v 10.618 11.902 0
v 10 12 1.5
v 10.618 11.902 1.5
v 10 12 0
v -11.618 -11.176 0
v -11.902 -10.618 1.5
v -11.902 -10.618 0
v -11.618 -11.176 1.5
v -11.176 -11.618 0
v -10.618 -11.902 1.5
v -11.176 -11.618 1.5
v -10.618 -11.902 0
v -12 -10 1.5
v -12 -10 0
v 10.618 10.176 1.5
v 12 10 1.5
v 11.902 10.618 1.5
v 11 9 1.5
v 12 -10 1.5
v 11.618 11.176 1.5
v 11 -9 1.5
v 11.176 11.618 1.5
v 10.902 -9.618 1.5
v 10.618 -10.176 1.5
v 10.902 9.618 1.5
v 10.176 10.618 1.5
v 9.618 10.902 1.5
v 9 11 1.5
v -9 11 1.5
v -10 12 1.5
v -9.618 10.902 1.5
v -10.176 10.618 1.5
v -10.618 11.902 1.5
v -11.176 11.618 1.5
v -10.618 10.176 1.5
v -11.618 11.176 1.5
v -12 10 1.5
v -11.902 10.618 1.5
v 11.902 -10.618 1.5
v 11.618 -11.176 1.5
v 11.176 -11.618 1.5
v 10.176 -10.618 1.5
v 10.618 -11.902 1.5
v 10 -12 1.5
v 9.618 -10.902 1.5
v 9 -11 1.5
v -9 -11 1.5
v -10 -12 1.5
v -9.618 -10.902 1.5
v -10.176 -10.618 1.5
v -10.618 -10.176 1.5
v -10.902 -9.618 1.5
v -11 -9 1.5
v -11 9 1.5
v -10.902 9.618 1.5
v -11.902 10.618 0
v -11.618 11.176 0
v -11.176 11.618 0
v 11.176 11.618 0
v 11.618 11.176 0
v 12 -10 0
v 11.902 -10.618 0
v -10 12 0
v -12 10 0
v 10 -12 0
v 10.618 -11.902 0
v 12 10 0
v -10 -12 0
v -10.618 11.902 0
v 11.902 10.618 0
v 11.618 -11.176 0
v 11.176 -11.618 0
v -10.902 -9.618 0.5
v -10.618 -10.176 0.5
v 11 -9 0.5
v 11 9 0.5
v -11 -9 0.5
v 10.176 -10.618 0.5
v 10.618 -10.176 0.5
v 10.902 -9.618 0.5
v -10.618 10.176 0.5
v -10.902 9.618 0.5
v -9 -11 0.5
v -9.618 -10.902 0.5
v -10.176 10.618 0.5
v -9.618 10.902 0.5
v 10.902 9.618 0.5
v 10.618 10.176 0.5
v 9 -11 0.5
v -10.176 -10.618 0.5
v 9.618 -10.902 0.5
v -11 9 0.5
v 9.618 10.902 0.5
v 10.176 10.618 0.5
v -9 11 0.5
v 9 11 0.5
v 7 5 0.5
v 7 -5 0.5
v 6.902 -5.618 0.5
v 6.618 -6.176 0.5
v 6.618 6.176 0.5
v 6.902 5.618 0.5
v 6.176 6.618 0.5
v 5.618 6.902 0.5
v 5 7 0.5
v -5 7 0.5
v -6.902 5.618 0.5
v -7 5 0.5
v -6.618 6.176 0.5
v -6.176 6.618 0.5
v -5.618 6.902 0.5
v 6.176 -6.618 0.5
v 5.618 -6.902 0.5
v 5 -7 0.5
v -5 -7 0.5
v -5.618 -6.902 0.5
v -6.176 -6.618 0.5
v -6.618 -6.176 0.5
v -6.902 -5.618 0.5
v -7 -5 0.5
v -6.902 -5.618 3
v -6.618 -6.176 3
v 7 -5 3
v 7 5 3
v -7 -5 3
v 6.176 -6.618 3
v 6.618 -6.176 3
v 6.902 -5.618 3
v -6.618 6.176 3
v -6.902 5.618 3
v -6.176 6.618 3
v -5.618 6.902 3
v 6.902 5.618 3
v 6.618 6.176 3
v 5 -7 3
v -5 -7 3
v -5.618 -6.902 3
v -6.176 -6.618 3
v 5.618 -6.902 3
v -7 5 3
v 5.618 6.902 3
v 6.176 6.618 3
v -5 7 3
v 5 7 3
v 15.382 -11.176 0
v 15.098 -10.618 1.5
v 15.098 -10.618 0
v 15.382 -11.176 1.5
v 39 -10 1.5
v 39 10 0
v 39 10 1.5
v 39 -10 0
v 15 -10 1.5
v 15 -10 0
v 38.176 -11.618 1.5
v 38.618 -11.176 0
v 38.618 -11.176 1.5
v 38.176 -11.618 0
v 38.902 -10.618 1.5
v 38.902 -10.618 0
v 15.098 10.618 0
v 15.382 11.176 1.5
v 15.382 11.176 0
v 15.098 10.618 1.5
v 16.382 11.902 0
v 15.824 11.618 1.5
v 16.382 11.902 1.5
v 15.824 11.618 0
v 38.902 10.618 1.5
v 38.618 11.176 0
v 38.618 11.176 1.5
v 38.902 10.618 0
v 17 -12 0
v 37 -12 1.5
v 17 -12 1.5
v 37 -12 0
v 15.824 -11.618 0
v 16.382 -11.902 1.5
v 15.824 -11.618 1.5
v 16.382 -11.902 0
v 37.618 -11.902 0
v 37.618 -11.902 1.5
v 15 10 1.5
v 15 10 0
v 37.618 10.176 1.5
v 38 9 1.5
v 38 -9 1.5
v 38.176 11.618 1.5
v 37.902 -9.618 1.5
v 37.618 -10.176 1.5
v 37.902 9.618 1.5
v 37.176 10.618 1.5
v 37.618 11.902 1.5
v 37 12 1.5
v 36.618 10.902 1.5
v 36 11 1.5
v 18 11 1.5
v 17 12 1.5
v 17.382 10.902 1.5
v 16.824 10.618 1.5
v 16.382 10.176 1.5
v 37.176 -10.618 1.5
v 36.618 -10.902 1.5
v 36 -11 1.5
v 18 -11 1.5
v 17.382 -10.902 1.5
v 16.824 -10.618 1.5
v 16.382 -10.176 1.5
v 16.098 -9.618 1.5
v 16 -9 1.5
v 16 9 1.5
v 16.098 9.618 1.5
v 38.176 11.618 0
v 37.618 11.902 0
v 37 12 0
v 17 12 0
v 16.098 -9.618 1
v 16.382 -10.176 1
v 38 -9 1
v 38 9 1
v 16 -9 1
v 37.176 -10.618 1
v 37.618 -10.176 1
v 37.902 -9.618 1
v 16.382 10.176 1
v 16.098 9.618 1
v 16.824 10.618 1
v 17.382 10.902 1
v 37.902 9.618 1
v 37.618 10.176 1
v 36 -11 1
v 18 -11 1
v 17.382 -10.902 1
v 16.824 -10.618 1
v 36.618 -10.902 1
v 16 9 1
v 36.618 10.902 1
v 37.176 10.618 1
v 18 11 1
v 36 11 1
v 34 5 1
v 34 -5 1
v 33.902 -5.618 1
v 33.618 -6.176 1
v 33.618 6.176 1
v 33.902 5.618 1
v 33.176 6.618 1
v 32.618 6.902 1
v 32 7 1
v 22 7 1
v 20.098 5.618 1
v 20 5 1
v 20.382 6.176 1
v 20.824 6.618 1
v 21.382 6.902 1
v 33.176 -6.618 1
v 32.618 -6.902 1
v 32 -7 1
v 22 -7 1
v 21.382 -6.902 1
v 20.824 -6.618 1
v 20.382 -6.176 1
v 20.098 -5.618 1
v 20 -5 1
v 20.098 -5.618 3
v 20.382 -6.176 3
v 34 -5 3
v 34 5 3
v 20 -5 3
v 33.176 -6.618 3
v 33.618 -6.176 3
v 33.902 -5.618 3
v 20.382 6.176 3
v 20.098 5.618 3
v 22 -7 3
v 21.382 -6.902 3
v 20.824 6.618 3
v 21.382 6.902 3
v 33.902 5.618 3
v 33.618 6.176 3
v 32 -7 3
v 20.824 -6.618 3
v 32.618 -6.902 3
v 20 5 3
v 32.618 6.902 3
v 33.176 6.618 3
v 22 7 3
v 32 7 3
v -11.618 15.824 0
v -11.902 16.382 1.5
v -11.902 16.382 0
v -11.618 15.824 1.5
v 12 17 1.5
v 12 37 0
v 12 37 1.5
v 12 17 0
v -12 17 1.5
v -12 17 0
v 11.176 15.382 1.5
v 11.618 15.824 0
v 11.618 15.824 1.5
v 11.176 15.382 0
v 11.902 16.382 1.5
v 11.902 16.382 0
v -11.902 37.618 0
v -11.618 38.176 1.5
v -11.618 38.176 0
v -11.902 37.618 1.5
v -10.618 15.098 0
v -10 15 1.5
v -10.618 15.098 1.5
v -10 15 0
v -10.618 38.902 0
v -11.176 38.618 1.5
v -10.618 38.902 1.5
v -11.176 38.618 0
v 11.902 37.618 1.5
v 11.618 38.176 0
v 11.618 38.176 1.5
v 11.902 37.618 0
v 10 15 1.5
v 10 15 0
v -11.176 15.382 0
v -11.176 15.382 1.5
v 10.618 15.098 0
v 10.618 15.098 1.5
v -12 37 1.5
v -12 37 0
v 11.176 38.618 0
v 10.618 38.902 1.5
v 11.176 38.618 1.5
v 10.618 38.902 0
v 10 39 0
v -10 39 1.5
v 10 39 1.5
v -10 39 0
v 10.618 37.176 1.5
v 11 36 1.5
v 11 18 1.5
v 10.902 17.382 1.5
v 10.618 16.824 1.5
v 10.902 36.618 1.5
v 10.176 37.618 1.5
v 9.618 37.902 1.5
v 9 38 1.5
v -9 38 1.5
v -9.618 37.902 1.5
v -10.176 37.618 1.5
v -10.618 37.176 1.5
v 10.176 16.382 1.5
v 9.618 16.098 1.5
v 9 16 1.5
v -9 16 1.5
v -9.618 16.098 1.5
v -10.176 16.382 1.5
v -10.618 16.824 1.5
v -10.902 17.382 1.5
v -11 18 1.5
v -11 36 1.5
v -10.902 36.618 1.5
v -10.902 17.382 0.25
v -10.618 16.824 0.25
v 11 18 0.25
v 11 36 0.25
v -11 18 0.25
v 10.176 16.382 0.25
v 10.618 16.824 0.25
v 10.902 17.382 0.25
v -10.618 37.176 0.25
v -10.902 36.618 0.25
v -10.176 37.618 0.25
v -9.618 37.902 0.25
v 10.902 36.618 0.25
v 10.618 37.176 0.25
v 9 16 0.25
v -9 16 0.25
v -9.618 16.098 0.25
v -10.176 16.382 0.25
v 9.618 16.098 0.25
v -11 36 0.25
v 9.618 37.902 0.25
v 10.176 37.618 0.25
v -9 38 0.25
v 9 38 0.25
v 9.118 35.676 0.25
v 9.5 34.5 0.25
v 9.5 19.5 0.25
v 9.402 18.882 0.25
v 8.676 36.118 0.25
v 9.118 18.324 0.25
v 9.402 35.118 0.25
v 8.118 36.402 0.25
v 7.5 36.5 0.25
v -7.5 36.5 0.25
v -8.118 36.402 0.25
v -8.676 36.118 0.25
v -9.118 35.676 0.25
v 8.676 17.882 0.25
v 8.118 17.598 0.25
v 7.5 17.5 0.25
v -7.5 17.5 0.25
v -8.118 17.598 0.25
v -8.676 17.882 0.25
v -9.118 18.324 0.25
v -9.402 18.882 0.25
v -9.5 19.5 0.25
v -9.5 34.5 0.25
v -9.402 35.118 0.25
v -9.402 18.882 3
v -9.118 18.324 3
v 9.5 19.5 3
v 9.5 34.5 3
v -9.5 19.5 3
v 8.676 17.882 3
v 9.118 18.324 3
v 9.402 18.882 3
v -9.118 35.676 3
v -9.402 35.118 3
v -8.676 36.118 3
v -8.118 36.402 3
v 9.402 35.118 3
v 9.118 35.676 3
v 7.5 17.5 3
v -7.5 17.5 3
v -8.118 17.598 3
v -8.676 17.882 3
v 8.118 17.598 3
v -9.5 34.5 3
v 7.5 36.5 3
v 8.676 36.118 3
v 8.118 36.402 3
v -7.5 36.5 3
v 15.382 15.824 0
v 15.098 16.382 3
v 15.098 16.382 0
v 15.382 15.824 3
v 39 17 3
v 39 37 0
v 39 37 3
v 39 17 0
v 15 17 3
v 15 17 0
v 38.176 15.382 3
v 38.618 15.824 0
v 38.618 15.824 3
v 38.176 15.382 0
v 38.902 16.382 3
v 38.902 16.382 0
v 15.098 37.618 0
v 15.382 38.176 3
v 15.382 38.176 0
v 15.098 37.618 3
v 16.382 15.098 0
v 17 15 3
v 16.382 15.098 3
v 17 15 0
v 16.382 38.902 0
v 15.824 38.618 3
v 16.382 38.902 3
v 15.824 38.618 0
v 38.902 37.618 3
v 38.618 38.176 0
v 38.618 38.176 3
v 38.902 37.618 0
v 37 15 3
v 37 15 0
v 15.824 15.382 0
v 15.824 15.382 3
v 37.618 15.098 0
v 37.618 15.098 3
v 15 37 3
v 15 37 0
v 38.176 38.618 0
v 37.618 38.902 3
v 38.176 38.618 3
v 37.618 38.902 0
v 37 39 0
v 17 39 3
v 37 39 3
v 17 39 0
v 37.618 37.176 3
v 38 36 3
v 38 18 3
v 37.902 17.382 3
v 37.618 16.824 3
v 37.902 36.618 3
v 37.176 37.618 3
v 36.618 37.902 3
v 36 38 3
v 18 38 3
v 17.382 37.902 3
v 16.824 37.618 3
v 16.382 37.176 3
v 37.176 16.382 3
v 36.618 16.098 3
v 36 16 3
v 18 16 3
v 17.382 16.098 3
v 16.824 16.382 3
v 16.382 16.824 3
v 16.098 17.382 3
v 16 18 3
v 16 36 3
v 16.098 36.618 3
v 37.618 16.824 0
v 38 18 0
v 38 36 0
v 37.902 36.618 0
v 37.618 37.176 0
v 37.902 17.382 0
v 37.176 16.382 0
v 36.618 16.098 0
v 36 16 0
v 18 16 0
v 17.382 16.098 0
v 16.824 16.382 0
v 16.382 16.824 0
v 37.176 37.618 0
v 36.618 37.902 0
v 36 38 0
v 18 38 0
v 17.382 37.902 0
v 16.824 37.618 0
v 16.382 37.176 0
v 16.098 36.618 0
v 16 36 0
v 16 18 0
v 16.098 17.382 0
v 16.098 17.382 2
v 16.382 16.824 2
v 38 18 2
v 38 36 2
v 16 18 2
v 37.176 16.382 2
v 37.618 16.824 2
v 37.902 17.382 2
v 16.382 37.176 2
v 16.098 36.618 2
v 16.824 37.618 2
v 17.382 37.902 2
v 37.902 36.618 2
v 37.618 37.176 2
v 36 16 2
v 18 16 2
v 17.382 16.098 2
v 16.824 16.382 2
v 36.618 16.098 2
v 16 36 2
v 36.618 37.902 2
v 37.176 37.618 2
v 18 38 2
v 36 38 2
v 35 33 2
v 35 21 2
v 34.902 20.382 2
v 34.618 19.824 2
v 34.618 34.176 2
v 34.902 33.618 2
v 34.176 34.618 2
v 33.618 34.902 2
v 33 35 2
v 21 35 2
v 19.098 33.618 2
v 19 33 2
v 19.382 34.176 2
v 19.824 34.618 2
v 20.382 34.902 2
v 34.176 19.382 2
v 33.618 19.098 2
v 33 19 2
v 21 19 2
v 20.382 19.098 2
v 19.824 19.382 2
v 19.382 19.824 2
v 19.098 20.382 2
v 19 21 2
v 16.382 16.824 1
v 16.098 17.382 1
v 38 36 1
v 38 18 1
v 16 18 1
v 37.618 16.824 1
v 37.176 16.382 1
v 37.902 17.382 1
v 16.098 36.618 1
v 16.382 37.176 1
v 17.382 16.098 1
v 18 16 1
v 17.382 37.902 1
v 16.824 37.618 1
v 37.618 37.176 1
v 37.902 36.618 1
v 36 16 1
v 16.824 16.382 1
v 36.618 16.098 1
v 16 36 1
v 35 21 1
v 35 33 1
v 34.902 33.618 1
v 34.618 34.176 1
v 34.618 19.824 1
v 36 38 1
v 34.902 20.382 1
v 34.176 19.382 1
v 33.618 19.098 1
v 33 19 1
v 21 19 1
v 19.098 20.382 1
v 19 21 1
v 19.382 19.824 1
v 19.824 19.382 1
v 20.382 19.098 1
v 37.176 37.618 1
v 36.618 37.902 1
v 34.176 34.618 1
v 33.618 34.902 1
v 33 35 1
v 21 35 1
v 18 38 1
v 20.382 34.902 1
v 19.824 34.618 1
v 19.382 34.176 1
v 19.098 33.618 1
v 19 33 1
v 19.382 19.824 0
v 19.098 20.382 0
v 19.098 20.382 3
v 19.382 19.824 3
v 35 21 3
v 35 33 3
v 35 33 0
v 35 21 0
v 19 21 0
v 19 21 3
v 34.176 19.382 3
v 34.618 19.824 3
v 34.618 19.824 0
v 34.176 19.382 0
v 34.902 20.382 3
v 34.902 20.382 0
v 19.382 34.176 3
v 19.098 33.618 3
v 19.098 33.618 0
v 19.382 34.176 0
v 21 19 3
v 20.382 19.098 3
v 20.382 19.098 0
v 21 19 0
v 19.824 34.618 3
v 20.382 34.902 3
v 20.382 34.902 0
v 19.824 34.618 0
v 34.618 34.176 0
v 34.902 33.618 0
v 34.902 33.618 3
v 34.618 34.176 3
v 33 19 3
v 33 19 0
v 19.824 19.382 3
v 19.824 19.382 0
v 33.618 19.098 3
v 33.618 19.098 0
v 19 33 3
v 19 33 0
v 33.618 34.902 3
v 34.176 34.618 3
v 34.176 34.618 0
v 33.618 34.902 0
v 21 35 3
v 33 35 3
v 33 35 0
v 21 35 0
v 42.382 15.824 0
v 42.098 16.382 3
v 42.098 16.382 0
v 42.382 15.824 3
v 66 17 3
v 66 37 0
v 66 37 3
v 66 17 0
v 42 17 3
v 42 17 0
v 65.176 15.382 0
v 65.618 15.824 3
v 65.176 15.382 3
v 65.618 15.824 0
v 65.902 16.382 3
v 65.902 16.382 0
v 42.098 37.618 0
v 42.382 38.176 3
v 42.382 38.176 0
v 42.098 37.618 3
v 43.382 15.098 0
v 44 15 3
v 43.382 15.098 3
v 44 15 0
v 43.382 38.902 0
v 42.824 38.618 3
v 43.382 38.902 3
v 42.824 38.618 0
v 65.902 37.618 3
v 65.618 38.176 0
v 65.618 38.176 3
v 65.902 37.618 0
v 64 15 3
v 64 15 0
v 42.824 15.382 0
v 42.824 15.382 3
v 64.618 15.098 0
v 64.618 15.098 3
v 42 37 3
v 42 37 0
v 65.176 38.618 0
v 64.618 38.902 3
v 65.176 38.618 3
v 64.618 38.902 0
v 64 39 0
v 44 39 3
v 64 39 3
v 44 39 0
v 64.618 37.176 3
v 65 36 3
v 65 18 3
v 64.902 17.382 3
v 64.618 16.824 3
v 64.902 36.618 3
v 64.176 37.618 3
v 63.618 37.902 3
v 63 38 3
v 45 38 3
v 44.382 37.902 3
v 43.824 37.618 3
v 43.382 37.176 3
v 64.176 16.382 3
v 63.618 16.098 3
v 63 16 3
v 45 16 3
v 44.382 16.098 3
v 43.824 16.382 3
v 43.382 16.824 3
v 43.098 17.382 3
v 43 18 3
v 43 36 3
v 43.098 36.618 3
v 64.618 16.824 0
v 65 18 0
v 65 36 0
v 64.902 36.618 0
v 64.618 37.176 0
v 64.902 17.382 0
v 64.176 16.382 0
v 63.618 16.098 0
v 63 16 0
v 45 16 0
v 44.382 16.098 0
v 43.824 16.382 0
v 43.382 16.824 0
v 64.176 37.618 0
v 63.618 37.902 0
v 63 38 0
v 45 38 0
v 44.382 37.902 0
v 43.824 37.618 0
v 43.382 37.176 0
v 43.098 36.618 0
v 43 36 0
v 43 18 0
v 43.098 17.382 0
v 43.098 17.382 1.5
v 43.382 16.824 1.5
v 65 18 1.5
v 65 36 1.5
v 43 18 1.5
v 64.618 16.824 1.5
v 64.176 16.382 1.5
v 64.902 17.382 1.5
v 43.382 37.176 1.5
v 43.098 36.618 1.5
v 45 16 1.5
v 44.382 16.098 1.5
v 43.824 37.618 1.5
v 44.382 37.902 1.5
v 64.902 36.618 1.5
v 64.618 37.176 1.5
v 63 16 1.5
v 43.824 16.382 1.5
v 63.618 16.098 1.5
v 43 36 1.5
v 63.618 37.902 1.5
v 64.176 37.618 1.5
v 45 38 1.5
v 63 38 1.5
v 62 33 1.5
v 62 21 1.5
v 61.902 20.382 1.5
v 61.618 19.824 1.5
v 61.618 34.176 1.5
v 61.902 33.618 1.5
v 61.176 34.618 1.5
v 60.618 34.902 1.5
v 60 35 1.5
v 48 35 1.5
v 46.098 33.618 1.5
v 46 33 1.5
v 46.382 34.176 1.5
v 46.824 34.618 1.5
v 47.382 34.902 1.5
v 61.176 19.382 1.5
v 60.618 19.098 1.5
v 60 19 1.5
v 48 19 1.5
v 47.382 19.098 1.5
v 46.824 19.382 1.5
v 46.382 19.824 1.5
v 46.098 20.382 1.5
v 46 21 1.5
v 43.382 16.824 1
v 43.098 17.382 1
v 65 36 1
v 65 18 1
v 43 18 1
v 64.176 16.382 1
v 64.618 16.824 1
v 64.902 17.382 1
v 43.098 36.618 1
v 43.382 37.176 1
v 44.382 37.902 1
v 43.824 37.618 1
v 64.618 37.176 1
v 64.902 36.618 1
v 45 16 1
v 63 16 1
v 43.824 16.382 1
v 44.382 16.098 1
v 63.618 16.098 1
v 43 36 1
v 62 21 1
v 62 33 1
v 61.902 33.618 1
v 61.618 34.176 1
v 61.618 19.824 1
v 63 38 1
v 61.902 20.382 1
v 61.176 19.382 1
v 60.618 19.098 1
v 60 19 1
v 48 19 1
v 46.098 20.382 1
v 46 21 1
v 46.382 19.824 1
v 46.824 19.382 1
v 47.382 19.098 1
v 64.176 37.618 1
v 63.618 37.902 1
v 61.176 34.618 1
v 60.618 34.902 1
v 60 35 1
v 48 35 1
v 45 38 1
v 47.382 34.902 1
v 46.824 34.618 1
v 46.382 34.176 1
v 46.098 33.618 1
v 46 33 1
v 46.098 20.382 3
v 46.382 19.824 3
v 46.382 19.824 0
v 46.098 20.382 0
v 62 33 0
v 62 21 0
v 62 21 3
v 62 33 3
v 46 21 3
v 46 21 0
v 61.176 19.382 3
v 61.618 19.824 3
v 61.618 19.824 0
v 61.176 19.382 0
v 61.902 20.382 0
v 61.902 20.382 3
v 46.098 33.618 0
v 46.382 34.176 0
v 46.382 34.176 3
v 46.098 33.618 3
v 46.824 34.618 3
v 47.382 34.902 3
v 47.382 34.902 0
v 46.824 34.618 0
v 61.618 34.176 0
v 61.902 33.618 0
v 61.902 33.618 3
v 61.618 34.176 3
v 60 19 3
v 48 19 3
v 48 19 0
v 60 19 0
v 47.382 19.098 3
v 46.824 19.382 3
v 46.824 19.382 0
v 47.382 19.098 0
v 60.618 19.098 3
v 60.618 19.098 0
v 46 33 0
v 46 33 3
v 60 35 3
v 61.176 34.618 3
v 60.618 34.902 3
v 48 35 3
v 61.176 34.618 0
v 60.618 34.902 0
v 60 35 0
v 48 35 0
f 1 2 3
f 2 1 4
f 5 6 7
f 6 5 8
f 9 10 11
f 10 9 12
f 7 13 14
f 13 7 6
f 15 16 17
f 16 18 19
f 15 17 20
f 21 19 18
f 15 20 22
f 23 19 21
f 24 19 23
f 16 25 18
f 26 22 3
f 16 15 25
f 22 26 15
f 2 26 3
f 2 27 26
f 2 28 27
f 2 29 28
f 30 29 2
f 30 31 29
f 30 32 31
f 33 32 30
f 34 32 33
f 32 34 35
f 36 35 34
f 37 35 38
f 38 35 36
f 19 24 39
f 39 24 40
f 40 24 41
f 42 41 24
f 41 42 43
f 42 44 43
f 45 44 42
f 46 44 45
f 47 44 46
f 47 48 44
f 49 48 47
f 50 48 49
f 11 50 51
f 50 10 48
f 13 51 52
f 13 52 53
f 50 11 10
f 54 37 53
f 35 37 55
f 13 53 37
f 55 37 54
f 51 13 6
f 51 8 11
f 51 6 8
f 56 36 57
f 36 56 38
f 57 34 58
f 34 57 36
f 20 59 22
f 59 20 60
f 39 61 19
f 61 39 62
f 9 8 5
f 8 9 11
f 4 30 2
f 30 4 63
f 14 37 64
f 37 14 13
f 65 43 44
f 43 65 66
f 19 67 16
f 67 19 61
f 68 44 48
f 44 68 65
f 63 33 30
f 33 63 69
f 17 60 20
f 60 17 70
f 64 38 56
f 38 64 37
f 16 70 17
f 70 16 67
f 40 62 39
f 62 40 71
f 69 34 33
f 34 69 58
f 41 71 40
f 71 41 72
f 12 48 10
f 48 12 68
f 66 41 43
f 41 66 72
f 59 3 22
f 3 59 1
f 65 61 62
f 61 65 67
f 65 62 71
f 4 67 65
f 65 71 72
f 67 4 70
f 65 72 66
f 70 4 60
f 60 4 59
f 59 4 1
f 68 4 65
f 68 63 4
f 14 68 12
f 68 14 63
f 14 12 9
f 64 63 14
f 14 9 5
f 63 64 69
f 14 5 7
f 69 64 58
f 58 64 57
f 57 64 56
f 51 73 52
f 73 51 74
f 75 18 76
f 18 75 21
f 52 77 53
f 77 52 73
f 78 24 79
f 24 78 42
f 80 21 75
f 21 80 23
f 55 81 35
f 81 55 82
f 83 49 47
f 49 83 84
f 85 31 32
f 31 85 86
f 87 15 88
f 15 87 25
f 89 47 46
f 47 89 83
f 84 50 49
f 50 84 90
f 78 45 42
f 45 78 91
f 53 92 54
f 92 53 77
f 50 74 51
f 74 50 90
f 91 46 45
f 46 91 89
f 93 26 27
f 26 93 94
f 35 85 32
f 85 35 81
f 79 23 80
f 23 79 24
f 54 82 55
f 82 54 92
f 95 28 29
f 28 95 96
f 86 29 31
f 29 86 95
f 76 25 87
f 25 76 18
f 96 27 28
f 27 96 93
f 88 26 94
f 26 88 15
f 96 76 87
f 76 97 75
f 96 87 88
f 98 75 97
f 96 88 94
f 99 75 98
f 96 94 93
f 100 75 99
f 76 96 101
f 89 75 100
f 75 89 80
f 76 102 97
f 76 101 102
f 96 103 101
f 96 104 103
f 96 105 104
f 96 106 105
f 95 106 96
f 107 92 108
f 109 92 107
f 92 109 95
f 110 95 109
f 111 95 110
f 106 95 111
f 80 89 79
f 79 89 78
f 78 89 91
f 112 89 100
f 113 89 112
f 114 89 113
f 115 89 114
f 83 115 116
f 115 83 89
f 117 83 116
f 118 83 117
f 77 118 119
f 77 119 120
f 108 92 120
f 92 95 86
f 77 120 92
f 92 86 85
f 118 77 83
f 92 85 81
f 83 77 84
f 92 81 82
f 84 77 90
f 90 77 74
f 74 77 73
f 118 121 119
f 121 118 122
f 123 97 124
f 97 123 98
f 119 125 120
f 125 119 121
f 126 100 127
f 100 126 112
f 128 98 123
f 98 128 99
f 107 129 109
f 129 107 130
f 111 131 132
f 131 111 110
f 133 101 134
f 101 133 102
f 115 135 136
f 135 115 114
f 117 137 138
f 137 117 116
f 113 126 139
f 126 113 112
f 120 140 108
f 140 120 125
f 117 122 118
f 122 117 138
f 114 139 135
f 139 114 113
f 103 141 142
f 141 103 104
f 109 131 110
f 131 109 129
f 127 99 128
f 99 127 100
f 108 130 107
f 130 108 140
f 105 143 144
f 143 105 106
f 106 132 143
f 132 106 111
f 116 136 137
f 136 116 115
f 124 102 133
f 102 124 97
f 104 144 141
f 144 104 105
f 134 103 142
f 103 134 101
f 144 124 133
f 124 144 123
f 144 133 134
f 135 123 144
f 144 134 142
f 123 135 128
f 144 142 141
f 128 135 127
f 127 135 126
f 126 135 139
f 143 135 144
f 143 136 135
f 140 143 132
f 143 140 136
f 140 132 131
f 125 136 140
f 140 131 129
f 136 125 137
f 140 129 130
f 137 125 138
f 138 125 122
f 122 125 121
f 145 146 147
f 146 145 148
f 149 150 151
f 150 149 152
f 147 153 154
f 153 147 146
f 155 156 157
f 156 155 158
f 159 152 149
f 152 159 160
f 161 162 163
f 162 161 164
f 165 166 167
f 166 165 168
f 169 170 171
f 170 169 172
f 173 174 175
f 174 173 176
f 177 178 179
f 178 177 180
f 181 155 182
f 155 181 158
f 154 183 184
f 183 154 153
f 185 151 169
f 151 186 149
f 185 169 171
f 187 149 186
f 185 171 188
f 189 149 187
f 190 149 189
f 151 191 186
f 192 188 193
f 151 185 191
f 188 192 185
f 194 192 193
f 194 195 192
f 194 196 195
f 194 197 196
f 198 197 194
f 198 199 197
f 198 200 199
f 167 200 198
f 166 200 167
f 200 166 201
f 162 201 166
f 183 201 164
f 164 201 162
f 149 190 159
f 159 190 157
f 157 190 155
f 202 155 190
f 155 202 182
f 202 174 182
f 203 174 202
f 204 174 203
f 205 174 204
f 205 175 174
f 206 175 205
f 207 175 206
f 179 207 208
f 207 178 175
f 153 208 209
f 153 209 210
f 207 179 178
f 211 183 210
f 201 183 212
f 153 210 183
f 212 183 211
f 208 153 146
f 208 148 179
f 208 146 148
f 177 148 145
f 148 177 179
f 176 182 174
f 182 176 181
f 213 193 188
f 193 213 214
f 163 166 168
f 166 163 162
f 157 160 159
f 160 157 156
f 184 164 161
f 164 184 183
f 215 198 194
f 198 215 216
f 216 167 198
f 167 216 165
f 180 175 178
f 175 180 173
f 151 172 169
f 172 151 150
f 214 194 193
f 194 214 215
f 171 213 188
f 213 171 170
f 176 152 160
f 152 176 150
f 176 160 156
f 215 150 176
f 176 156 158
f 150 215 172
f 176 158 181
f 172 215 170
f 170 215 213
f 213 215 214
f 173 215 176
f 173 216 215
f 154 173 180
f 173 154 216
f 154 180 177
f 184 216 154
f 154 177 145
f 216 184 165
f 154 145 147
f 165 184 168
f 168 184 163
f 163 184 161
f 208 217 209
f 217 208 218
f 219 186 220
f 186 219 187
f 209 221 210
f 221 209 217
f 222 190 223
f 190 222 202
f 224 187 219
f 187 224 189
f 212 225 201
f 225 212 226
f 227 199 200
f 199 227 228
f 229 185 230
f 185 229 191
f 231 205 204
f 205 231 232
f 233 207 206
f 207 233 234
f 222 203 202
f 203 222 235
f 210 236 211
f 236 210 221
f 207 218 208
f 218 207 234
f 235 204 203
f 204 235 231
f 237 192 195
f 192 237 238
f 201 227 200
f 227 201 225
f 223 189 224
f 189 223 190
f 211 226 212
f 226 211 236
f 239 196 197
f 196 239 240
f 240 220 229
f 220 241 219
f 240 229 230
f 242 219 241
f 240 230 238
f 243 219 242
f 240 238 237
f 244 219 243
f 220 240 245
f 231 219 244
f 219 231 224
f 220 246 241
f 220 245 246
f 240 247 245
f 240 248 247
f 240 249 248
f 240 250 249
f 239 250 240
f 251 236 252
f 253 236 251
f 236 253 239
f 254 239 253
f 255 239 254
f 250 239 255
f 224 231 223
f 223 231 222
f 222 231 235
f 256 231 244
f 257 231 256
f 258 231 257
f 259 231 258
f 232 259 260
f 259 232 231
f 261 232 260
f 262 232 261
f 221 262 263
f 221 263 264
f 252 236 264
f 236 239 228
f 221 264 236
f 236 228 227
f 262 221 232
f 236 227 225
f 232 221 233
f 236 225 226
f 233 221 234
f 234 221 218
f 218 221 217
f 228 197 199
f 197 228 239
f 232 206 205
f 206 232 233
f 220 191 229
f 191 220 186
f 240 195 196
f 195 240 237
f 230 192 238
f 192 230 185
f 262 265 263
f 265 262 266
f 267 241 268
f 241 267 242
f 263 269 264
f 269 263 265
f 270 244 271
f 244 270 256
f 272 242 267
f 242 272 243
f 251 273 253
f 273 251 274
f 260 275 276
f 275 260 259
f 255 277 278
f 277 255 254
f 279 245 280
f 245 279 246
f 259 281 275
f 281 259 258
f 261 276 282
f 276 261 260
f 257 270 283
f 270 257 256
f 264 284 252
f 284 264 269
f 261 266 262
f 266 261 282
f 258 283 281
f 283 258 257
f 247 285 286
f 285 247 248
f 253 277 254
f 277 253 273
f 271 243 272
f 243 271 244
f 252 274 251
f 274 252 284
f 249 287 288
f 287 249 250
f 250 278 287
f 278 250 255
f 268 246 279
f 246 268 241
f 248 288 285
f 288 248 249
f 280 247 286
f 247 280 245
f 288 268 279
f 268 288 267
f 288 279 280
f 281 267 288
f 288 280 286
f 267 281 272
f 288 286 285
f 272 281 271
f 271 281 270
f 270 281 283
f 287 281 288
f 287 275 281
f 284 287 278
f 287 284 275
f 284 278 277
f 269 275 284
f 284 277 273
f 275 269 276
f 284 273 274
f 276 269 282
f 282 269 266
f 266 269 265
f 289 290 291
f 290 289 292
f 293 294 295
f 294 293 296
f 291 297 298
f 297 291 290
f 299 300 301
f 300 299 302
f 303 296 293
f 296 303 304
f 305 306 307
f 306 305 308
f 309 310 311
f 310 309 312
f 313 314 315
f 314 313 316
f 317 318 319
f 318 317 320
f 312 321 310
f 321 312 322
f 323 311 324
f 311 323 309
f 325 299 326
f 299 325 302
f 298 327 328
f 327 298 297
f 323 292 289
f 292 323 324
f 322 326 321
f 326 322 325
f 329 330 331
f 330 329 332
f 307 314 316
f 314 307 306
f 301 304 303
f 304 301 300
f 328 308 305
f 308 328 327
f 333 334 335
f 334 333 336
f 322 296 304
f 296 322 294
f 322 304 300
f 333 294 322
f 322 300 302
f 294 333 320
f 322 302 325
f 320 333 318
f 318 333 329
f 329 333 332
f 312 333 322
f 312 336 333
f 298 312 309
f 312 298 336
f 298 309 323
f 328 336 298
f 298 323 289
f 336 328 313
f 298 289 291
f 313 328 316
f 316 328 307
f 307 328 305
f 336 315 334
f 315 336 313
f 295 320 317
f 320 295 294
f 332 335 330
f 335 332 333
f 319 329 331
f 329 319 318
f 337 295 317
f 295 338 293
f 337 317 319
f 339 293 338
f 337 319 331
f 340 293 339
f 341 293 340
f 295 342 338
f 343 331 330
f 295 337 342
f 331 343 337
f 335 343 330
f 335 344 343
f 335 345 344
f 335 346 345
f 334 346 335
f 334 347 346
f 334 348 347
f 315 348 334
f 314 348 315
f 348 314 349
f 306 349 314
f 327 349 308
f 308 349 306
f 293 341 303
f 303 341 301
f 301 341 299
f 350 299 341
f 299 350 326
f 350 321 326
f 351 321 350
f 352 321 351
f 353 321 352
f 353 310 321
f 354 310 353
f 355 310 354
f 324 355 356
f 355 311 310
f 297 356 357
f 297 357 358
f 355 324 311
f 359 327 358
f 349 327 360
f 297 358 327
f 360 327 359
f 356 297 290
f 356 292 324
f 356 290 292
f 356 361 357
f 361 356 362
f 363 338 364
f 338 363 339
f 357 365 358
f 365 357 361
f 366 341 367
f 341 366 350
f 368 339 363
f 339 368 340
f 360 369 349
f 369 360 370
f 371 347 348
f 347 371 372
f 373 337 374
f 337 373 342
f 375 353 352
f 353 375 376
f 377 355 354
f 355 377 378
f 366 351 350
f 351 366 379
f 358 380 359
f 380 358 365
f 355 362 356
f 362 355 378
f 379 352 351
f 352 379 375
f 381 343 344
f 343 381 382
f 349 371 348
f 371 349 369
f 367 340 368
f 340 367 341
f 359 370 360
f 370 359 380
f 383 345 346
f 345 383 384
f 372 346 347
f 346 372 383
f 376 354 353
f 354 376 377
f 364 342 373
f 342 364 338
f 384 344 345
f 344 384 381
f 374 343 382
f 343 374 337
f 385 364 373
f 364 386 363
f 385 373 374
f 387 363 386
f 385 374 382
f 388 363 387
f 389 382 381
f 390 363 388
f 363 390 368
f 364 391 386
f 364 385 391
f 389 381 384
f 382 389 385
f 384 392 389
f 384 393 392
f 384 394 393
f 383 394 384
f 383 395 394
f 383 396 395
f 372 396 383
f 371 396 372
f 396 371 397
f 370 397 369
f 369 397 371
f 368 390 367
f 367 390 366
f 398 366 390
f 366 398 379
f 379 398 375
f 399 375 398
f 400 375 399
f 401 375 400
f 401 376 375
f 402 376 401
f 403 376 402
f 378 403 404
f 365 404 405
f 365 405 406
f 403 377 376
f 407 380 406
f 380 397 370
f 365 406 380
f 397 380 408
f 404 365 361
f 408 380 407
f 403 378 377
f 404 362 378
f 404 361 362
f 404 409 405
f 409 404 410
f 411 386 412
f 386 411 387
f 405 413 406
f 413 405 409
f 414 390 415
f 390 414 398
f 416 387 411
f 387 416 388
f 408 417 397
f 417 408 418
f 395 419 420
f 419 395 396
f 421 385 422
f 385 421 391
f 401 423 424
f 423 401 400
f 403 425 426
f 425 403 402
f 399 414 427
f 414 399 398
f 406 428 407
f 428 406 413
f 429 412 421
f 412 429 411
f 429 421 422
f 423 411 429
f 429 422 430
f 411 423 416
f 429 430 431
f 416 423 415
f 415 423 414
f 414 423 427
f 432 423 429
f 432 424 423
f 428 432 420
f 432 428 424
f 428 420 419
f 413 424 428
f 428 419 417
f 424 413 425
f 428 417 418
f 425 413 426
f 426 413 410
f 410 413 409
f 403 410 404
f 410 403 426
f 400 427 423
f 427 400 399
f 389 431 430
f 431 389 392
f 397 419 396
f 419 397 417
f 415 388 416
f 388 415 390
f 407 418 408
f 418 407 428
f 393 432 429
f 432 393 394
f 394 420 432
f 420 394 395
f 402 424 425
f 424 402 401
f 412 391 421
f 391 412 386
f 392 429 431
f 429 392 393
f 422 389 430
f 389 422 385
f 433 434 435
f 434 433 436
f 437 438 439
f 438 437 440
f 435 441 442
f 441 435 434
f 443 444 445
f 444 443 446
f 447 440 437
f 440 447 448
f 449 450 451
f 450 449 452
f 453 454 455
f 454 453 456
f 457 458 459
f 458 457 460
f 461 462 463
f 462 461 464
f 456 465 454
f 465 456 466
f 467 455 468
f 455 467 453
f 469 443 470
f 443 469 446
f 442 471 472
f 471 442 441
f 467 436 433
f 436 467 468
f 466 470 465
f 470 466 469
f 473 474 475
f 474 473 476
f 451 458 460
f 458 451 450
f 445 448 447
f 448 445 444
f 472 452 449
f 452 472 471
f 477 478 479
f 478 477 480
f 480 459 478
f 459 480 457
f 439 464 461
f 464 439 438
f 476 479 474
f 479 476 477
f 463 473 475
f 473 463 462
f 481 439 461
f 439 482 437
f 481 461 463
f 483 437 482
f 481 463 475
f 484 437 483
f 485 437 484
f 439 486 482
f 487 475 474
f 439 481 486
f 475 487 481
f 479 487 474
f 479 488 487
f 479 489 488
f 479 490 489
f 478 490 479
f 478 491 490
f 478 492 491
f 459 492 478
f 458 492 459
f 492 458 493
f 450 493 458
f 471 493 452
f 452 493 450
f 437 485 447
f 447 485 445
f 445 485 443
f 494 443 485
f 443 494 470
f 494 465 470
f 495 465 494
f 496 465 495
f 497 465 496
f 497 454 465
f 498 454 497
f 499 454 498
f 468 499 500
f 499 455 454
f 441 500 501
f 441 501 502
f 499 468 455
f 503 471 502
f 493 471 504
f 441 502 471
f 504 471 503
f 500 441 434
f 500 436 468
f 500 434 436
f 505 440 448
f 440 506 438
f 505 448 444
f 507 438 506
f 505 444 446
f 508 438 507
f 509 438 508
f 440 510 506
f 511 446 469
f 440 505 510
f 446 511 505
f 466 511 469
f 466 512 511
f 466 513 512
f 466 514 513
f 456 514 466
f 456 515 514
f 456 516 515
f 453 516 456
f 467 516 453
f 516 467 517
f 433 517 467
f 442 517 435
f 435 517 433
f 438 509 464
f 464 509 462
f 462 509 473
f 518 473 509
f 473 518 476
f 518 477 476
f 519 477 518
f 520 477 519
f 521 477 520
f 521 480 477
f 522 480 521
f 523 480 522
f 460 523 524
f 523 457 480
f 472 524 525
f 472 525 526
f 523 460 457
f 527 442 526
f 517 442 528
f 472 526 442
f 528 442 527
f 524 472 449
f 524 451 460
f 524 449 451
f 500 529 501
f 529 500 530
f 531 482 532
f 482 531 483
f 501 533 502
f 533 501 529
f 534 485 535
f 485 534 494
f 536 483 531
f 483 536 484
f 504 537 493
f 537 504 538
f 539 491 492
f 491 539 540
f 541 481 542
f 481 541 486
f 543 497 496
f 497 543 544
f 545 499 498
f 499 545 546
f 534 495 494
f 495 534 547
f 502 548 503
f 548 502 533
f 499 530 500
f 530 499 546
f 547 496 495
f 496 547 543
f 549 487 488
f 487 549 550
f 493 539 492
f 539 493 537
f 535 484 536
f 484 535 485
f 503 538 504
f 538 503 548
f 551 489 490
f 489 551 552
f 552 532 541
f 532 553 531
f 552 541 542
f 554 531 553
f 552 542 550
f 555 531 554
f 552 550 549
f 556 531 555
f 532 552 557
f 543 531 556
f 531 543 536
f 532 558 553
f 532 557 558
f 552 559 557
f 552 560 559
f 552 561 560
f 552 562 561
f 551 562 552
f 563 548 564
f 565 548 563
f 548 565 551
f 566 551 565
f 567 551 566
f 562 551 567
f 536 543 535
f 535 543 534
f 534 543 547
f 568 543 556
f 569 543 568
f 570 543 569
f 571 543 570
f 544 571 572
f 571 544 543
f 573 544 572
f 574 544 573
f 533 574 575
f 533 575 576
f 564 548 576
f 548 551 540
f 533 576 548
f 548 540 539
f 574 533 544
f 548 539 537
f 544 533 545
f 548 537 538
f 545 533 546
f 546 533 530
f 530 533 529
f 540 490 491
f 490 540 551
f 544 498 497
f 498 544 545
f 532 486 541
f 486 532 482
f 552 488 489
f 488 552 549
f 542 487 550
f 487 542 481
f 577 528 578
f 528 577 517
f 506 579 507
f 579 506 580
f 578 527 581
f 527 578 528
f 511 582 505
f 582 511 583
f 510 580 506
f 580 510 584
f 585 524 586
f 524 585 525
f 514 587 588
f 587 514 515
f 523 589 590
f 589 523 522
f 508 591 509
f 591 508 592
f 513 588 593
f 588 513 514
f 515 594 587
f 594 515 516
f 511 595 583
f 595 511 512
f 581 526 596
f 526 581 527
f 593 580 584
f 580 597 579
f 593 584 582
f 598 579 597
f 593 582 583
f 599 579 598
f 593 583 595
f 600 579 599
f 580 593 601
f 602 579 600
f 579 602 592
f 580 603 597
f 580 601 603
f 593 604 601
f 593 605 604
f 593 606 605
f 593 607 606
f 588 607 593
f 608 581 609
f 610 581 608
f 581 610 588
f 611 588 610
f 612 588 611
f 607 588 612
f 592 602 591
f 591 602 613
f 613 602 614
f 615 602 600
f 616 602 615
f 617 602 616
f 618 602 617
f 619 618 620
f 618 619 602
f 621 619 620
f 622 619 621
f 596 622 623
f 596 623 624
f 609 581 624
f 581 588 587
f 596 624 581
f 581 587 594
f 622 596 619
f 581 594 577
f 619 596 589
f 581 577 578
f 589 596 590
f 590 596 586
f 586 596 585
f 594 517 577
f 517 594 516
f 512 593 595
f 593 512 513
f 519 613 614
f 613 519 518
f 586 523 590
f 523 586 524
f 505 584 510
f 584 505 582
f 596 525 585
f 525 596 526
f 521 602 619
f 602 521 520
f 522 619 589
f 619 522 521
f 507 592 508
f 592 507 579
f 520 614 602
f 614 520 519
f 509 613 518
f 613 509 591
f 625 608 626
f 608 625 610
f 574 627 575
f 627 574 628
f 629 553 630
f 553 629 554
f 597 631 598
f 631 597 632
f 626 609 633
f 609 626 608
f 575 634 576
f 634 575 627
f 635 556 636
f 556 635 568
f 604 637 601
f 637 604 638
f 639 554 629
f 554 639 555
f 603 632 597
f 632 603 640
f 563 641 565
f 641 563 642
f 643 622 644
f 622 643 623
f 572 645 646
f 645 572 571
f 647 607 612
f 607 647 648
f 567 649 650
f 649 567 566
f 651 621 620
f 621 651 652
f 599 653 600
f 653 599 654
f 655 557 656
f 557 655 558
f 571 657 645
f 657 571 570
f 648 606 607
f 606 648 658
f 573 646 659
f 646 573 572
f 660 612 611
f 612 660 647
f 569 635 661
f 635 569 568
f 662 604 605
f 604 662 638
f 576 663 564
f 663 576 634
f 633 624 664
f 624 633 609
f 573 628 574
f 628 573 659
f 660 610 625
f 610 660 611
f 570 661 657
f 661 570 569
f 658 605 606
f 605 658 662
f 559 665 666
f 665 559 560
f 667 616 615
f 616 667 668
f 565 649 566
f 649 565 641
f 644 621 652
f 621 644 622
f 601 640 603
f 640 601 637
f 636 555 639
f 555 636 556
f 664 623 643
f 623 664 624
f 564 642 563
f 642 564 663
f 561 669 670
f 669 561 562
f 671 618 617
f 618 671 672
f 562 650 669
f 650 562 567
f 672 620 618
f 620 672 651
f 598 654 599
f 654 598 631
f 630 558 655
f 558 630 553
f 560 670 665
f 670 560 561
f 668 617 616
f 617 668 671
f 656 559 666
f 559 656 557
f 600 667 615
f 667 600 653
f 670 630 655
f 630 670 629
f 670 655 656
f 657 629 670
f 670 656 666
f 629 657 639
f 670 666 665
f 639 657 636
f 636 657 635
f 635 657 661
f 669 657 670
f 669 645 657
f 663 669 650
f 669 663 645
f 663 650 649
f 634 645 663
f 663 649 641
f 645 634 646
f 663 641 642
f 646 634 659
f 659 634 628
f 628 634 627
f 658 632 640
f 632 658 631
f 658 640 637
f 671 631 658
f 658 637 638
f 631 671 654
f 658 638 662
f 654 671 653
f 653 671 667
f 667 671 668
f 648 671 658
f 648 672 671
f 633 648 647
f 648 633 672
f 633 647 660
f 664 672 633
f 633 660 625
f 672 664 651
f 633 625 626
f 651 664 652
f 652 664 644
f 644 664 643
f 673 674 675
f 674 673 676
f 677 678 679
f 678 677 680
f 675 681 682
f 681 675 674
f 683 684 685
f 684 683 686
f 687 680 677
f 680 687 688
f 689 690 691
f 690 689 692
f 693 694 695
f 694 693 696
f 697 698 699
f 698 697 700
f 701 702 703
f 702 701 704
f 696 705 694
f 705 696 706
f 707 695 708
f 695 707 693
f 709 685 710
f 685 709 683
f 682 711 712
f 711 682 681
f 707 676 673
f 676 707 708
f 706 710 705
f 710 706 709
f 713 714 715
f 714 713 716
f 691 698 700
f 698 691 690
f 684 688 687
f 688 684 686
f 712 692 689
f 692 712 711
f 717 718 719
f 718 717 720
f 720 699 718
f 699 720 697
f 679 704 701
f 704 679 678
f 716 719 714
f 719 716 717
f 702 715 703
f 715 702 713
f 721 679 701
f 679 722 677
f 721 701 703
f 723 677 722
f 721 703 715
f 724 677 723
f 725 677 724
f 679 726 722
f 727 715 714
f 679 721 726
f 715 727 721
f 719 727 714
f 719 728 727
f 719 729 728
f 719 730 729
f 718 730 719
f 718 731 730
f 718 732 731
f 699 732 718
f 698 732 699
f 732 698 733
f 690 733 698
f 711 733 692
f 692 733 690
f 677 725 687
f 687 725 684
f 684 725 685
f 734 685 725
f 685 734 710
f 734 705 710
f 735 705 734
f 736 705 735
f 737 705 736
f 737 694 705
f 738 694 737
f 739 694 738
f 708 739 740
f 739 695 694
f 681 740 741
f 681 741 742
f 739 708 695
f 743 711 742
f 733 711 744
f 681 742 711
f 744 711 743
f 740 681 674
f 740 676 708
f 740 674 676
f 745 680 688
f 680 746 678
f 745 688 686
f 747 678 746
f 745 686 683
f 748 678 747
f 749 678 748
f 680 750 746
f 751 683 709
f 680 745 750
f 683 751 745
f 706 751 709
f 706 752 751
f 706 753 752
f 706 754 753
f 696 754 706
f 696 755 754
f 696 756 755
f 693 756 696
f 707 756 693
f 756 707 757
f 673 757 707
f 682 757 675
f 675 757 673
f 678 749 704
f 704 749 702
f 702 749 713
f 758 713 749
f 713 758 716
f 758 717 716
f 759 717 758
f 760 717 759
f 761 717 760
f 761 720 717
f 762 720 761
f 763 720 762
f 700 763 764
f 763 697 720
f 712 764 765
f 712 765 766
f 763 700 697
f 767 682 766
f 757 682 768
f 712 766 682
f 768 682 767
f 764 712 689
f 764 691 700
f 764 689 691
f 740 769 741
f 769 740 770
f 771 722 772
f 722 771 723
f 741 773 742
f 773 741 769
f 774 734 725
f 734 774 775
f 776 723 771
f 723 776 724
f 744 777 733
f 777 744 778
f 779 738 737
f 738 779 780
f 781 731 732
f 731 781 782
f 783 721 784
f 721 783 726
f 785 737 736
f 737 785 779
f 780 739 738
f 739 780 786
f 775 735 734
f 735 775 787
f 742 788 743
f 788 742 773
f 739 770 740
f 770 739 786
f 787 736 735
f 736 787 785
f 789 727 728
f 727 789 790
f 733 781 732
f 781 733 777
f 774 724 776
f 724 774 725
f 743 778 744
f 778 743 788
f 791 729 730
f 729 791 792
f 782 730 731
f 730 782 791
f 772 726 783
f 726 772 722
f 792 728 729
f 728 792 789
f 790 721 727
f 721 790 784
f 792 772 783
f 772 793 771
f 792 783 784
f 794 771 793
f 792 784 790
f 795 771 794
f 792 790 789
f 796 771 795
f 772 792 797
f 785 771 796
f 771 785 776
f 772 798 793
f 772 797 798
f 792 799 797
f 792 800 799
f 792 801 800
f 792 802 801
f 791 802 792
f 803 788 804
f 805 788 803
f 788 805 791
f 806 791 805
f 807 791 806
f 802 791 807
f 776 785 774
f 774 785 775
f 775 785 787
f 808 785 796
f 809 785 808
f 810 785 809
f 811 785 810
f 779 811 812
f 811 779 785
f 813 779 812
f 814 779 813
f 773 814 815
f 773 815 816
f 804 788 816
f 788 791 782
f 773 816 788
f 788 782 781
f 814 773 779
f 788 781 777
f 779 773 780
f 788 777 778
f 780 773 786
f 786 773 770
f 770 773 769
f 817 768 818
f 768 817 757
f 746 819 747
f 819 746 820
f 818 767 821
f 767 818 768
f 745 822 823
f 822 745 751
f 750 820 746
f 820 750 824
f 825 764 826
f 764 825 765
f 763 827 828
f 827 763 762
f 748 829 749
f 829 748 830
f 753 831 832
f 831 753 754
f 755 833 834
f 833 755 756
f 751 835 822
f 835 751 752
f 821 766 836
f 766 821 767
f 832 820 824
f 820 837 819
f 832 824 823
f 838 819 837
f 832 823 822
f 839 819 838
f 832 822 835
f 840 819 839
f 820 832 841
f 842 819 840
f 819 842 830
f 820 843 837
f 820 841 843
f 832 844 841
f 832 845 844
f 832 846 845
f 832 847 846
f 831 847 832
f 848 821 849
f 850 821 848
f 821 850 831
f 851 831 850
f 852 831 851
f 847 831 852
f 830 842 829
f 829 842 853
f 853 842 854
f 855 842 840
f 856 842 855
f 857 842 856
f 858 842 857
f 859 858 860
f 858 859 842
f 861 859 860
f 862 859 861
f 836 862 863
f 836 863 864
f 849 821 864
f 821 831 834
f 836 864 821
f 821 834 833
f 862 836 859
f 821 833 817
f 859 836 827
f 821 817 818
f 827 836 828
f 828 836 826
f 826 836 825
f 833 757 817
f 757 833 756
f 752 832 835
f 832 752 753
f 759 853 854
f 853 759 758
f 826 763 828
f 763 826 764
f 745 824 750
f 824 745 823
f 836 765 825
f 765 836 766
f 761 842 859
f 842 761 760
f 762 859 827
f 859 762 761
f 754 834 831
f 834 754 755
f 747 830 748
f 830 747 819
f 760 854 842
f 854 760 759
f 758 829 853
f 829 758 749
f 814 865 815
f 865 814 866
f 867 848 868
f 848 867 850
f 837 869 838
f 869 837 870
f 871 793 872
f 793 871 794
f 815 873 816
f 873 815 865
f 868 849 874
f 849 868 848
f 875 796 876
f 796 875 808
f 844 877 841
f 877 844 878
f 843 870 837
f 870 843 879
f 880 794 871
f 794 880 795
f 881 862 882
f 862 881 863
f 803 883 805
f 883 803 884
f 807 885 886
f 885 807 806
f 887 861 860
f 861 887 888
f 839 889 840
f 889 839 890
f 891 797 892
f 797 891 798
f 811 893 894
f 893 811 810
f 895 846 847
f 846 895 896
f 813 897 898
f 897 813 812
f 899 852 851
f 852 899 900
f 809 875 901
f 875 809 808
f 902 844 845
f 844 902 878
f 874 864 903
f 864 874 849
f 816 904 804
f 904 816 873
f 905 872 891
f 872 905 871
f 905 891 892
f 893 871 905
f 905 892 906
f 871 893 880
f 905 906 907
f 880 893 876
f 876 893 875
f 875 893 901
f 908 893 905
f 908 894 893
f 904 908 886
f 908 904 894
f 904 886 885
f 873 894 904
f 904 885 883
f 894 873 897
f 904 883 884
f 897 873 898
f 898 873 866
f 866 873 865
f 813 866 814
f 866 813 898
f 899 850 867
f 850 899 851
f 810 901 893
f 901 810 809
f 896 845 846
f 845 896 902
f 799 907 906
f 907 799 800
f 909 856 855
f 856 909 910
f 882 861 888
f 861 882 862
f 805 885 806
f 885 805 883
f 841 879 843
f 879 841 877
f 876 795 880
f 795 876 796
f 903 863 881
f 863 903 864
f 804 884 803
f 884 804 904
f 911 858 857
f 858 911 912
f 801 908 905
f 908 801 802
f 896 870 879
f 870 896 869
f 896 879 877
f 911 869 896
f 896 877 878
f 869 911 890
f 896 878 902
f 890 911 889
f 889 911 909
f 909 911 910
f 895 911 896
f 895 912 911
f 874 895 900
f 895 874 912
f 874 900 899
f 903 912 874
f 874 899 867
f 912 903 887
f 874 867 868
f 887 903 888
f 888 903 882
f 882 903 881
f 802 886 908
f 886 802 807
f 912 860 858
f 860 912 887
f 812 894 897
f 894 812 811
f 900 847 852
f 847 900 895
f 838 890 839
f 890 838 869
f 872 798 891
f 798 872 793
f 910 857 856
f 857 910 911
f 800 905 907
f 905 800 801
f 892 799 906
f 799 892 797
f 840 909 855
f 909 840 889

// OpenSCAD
$fn=20;

module roundedrect(w=10, h=10, z=1, r=2) {
    linear_extrude(z) translate([-w/2, -h/2, 0]) hull() {
        translate([0, 0, 0]) circle(r);
        translate([w, 0, 0]) circle(r);
        translate([0, h, 0]) circle(r);
        translate([w, h, 0]) circle(r);
    }
}

// T0, surw=5mm, surh=0.5mm

translate([0*25,0,0]) {
    difference() {
        roundedrect(w=20, h=20, z=1.5, r=2);
        translate([0, 0, 0.5]) roundedrect(w=18, h=18, z=2, r=2);
    }

    roundedrect(w=10, h=10, z=3, r=2);
}

// T1, surw=5mm, surh=1mm

translate([1*27,0,0]) {
    difference() {
        roundedrect(w=20, h=20, z=1.5, r=2);
        translate([0, 0, 1]) roundedrect(w=18, h=18, z=2, r=2);
    }

    roundedrect(w=10, h=10, z=3, r=2);
}

// T2, surw=7.5mm, surh=0.25mm

translate([0*27,27,0]) {
    difference() {
        roundedrect(w=20, h=20, z=1.5, r=2);
        translate([0, 0, 0.25]) roundedrect(w=18, h=18, z=2, r=2);
    }

    roundedrect(w=15, h=15, z=3, r=2);
}

// T3, air, surw=6mm, surh=1mm

translate([1*27,27,0]) {
    difference() {
        roundedrect(w=20, h=20, z=3, r=2);
        translate([0, 0, 2]) roundedrect(w=18, h=18, z=1.5, r=2);
        translate([0, 0, -0.5]) roundedrect(w=18, h=18, z=1.5, r=2);
    }

    roundedrect(w=12, h=12, z=3, r=2);
}

// T3, air, surw=6mm, surh=0.5mm

translate([2*27,27,0]) {
    difference() {
        roundedrect(w=20, h=20, z=3, r=2);
        translate([0, 0, 1.5]) roundedrect(w=18, h=18, z=2, r=2);
        translate([0, 0, -0.5]) roundedrect(w=18, h=18, z=1.5, r=2);
    }

    roundedrect(w=12, h=12, z=3, r=2);
}
